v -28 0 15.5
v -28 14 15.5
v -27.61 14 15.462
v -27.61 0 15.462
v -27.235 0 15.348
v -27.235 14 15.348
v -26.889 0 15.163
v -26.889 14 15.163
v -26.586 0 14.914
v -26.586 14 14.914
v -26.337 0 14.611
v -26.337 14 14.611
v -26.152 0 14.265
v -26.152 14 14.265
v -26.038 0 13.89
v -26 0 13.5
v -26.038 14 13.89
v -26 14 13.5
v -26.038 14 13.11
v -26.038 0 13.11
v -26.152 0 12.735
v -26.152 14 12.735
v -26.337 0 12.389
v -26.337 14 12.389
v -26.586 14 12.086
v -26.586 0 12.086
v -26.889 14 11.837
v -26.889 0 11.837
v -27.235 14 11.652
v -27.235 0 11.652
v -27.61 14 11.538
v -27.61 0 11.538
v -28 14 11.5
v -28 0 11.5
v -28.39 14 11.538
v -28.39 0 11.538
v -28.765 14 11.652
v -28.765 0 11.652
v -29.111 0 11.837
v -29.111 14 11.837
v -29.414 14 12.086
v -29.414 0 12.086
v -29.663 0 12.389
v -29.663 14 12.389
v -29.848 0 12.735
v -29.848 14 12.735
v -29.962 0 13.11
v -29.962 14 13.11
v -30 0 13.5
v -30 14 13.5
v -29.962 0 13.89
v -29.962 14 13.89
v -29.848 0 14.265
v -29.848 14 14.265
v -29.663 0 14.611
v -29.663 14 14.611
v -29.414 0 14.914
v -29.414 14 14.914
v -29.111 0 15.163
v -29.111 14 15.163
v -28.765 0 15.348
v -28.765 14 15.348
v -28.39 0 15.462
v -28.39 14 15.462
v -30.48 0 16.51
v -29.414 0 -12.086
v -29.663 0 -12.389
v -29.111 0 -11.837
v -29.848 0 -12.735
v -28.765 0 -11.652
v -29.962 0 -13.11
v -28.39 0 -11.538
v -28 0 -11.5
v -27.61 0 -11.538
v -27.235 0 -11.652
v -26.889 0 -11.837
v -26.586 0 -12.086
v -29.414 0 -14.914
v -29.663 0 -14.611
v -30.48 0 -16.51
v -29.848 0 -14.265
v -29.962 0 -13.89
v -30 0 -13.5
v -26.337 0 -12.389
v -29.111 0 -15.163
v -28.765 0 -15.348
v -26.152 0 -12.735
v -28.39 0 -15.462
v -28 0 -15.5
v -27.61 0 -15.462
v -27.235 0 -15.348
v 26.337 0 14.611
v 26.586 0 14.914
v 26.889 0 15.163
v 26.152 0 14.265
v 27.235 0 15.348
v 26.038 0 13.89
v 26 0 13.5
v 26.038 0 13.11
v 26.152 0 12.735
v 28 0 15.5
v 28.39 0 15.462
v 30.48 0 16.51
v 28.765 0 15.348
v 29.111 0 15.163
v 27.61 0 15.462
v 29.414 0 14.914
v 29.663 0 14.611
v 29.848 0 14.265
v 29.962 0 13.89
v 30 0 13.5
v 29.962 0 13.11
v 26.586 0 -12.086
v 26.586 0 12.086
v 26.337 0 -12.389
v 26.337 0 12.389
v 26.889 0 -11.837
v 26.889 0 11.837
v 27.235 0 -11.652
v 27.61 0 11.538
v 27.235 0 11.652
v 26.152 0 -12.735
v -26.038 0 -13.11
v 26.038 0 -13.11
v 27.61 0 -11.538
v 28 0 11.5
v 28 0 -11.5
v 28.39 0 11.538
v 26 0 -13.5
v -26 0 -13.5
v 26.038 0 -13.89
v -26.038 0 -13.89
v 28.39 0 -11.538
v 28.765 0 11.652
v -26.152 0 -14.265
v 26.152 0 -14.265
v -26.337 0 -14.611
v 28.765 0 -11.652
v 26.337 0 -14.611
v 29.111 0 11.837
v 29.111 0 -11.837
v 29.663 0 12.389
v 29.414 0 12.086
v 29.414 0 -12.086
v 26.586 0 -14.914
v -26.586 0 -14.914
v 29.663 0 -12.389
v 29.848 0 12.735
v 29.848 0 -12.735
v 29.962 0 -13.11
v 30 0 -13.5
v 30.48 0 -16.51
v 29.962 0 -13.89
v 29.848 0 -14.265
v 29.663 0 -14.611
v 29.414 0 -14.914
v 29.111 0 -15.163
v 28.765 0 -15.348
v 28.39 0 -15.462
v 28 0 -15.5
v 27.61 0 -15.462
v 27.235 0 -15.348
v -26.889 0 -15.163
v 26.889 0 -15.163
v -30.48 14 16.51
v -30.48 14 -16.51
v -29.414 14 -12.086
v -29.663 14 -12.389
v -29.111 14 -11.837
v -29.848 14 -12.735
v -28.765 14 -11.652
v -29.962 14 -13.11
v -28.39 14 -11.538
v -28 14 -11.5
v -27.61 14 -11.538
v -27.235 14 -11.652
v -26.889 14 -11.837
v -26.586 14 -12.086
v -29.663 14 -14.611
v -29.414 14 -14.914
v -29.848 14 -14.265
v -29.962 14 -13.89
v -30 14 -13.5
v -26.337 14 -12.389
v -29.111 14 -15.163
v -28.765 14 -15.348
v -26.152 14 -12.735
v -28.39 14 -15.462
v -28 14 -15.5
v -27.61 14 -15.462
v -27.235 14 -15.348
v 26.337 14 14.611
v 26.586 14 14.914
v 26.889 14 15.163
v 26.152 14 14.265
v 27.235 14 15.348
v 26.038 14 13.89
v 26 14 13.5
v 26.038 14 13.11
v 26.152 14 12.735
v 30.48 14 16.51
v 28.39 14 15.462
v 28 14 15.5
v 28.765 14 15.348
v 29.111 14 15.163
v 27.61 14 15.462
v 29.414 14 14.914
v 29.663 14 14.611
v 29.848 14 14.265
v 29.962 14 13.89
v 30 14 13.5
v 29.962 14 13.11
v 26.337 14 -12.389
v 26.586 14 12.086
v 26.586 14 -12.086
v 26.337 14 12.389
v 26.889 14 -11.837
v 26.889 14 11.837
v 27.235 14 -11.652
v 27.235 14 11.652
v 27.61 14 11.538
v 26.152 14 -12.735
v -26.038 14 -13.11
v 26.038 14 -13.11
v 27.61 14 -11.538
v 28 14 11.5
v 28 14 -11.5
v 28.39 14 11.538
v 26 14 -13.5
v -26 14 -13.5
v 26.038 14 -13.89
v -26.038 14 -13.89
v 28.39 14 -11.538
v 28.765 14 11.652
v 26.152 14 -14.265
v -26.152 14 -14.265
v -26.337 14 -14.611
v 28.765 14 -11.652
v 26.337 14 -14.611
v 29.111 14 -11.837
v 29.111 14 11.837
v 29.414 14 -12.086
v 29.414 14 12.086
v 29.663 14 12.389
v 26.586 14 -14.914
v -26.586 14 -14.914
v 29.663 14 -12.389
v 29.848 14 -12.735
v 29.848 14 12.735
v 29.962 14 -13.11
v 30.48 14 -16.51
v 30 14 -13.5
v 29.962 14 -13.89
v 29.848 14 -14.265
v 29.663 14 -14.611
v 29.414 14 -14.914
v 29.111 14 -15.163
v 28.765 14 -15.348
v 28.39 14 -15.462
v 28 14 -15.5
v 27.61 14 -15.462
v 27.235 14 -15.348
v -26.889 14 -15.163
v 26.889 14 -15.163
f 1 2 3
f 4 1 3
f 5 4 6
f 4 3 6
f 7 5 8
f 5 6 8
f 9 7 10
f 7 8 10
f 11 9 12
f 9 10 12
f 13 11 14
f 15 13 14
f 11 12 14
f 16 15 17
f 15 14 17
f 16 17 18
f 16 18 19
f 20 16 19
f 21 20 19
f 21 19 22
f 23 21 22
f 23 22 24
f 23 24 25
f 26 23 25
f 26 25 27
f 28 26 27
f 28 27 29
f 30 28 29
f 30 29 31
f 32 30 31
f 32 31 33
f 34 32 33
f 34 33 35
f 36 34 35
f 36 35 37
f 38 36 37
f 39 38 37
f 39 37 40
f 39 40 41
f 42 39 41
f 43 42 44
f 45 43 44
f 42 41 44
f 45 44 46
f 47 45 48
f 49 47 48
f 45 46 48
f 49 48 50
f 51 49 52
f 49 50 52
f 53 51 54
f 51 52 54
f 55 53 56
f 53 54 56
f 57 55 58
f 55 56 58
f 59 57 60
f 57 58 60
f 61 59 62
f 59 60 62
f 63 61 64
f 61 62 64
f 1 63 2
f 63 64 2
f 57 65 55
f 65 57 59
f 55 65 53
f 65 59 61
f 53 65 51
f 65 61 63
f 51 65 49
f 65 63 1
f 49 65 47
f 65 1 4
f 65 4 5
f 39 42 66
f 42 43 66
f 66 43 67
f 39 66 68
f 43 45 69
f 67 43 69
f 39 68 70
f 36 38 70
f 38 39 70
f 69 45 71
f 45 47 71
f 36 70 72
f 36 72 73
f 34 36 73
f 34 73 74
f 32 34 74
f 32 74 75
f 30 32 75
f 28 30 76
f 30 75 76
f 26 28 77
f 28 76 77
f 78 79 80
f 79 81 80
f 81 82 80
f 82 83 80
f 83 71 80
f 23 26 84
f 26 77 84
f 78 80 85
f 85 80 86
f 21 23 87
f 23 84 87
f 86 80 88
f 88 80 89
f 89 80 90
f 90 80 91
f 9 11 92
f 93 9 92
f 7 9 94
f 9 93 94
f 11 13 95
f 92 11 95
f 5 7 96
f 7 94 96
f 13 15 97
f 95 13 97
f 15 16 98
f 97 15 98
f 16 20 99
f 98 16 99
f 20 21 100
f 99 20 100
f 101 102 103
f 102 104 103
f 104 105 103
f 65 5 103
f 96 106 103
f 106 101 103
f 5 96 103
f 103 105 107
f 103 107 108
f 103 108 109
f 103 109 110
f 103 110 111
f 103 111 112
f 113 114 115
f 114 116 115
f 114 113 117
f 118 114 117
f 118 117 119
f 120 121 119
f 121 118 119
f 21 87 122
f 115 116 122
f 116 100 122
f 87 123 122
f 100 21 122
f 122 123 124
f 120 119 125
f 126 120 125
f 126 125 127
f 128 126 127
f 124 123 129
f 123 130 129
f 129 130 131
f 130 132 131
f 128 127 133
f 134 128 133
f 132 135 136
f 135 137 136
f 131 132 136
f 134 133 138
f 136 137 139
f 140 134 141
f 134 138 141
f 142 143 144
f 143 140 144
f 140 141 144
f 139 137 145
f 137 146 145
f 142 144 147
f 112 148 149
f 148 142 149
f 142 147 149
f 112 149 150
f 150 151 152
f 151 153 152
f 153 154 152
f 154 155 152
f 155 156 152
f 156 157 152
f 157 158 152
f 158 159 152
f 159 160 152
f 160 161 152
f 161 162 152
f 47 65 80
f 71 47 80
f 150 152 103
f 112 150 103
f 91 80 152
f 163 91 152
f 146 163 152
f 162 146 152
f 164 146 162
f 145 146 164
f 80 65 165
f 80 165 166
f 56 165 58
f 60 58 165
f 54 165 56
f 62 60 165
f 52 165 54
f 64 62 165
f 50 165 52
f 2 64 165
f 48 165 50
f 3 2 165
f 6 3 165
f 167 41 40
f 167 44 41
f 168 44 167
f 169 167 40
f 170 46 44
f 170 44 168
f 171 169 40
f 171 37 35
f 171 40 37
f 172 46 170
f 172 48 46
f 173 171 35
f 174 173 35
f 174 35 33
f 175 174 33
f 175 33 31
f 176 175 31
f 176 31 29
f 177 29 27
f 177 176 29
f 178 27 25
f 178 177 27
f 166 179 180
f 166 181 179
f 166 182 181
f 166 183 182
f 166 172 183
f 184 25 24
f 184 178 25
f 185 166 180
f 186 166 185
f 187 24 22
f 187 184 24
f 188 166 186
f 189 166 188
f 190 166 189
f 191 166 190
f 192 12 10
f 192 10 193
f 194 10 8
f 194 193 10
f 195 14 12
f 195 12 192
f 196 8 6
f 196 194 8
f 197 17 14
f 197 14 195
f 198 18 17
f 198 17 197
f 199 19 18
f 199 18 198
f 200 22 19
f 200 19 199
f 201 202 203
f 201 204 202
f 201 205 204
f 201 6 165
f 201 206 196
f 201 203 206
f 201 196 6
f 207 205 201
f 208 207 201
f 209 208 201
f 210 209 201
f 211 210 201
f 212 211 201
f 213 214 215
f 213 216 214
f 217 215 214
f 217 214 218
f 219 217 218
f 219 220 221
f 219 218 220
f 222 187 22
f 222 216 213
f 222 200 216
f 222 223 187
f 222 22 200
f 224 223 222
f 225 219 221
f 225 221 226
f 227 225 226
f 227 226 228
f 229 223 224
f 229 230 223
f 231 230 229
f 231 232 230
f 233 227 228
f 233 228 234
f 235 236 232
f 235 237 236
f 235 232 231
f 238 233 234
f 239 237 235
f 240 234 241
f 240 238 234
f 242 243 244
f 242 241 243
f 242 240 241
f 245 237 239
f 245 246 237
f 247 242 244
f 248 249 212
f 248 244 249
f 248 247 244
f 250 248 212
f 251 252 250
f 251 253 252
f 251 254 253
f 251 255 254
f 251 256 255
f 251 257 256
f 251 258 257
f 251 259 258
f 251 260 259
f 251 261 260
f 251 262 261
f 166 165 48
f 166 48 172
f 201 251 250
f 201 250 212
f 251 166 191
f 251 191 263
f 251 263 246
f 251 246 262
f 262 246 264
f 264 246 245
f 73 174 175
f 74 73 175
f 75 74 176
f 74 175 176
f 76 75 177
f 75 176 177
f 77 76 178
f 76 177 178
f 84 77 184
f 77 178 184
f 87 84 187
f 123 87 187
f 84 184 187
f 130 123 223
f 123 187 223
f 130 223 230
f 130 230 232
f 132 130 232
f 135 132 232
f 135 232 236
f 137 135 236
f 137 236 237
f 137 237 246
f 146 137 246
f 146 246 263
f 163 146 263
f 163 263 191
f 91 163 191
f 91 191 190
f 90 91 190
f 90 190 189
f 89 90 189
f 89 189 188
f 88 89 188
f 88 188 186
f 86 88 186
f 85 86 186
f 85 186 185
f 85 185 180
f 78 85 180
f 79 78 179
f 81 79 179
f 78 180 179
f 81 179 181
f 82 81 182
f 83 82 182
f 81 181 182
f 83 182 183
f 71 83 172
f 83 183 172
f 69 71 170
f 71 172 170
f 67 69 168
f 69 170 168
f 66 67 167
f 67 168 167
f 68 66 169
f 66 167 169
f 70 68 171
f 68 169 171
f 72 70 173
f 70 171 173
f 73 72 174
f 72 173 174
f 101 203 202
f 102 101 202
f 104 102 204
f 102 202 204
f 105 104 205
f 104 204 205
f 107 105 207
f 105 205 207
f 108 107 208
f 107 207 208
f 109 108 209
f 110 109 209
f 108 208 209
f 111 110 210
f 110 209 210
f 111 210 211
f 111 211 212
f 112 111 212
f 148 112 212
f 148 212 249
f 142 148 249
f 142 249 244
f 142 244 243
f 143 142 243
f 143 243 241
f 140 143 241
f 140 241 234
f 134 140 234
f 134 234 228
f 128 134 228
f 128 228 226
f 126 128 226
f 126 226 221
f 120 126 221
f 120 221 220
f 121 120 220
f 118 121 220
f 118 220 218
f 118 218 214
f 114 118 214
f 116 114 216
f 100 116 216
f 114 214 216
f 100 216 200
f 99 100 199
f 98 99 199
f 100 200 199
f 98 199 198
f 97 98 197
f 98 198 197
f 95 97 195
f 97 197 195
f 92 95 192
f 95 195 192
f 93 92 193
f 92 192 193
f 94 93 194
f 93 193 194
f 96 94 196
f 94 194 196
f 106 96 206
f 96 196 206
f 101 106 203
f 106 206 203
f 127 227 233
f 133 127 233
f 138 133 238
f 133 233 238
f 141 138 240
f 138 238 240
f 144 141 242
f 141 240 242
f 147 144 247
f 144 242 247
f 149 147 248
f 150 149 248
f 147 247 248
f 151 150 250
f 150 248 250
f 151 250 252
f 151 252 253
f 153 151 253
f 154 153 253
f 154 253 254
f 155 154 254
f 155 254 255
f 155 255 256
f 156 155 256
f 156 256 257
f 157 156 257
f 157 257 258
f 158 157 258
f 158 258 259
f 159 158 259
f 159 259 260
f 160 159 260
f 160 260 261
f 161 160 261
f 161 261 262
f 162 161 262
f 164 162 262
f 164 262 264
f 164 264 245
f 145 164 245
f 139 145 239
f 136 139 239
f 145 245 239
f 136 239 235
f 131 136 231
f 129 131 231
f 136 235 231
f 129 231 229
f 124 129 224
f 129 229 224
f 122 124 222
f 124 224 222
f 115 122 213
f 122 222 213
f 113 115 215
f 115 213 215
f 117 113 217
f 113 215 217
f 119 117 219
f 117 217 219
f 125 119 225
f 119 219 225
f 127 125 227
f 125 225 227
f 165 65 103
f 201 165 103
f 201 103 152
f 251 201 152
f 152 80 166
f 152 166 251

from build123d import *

# Parameters (mm, degrees)
ESQUISSE1_W             = 60.96
ESQUISSE1_H             = 33.02
BOSS_EXTRU_1_DEPTH      = 14
ENL_V_MAT_EXTRU_1_REACH = 39.385
ESQUISSE2_R             = 2


with BuildPart() as part:
    # Esquisse1 → Boss.-Extru.1 (new body)
    with BuildSketch(Plane(origin=(0, 0, 0), x_dir=(1, 0, 0), z_dir=(0, 1, 0))):
        Rectangle(ESQUISSE1_W, ESQUISSE1_H)
    extrude(amount=BOSS_EXTRU_1_DEPTH)

    # Esquisse2 → Enlèv. mat.-Extru.1 (cut, up to next)
    with BuildSketch(Plane(origin=(0, 14, 0), x_dir=(1, 0, 0), z_dir=(0, 1, 0)), mode=Mode.PRIVATE) as enl_v_mat_extru_1_sk1:
        with Locations(Location((-28, 13.5, 0), (0, 0, 270))):
            Circle(ESQUISSE2_R)
    enl_v_mat_extru_1_tool1 = extrude(enl_v_mat_extru_1_sk1.sketch, amount=-ENL_V_MAT_EXTRU_1_REACH, mode=Mode.PRIVATE) & part.part
    # Esquisse2 → Enlèv. mat.-Extru.1 (cut, up to next)
    with BuildSketch(Plane(origin=(0, 14, 0), x_dir=(1, 0, 0), z_dir=(0, 1, 0)), mode=Mode.PRIVATE) as enl_v_mat_extru_1_sk2:
        with Locations(Location((28, 13.5, 0), (0, 0, 270))):
            Circle(ESQUISSE2_R)
    enl_v_mat_extru_1_tool2 = extrude(enl_v_mat_extru_1_sk2.sketch, amount=-ENL_V_MAT_EXTRU_1_REACH, mode=Mode.PRIVATE) & part.part
    # Esquisse2 → Enlèv. mat.-Extru.1 (cut, up to next)
    with BuildSketch(Plane(origin=(0, 14, 0), x_dir=(1, 0, 0), z_dir=(0, 1, 0)), mode=Mode.PRIVATE) as enl_v_mat_extru_1_sk3:
        with Locations(Location((28, -13.5, 0), (0, 0, 270))):
            Circle(ESQUISSE2_R)
    enl_v_mat_extru_1_tool3 = extrude(enl_v_mat_extru_1_sk3.sketch, amount=-ENL_V_MAT_EXTRU_1_REACH, mode=Mode.PRIVATE) & part.part
    # Esquisse2 → Enlèv. mat.-Extru.1 (cut, up to next)
    with BuildSketch(Plane(origin=(0, 14, 0), x_dir=(1, 0, 0), z_dir=(0, 1, 0)), mode=Mode.PRIVATE) as enl_v_mat_extru_1_sk4:
        with Locations(Location((-28, -13.5, 0), (0, 0, 270))):
            Circle(ESQUISSE2_R)
    enl_v_mat_extru_1_tool4 = extrude(enl_v_mat_extru_1_sk4.sketch, amount=-ENL_V_MAT_EXTRU_1_REACH, mode=Mode.PRIVATE) & part.part
    add(enl_v_mat_extru_1_tool1.solids().sort_by_distance((-28, 14, -13.5))[0], mode=Mode.SUBTRACT)
    add(enl_v_mat_extru_1_tool2.solids().sort_by_distance((28, 14, -13.5))[0], mode=Mode.SUBTRACT)
    add(enl_v_mat_extru_1_tool3.solids().sort_by_distance((28, 14, 13.5))[0], mode=Mode.SUBTRACT)
    add(enl_v_mat_extru_1_tool4.solids().sort_by_distance((-28, 14, 13.5))[0], mode=Mode.SUBTRACT)


solid = part.part
